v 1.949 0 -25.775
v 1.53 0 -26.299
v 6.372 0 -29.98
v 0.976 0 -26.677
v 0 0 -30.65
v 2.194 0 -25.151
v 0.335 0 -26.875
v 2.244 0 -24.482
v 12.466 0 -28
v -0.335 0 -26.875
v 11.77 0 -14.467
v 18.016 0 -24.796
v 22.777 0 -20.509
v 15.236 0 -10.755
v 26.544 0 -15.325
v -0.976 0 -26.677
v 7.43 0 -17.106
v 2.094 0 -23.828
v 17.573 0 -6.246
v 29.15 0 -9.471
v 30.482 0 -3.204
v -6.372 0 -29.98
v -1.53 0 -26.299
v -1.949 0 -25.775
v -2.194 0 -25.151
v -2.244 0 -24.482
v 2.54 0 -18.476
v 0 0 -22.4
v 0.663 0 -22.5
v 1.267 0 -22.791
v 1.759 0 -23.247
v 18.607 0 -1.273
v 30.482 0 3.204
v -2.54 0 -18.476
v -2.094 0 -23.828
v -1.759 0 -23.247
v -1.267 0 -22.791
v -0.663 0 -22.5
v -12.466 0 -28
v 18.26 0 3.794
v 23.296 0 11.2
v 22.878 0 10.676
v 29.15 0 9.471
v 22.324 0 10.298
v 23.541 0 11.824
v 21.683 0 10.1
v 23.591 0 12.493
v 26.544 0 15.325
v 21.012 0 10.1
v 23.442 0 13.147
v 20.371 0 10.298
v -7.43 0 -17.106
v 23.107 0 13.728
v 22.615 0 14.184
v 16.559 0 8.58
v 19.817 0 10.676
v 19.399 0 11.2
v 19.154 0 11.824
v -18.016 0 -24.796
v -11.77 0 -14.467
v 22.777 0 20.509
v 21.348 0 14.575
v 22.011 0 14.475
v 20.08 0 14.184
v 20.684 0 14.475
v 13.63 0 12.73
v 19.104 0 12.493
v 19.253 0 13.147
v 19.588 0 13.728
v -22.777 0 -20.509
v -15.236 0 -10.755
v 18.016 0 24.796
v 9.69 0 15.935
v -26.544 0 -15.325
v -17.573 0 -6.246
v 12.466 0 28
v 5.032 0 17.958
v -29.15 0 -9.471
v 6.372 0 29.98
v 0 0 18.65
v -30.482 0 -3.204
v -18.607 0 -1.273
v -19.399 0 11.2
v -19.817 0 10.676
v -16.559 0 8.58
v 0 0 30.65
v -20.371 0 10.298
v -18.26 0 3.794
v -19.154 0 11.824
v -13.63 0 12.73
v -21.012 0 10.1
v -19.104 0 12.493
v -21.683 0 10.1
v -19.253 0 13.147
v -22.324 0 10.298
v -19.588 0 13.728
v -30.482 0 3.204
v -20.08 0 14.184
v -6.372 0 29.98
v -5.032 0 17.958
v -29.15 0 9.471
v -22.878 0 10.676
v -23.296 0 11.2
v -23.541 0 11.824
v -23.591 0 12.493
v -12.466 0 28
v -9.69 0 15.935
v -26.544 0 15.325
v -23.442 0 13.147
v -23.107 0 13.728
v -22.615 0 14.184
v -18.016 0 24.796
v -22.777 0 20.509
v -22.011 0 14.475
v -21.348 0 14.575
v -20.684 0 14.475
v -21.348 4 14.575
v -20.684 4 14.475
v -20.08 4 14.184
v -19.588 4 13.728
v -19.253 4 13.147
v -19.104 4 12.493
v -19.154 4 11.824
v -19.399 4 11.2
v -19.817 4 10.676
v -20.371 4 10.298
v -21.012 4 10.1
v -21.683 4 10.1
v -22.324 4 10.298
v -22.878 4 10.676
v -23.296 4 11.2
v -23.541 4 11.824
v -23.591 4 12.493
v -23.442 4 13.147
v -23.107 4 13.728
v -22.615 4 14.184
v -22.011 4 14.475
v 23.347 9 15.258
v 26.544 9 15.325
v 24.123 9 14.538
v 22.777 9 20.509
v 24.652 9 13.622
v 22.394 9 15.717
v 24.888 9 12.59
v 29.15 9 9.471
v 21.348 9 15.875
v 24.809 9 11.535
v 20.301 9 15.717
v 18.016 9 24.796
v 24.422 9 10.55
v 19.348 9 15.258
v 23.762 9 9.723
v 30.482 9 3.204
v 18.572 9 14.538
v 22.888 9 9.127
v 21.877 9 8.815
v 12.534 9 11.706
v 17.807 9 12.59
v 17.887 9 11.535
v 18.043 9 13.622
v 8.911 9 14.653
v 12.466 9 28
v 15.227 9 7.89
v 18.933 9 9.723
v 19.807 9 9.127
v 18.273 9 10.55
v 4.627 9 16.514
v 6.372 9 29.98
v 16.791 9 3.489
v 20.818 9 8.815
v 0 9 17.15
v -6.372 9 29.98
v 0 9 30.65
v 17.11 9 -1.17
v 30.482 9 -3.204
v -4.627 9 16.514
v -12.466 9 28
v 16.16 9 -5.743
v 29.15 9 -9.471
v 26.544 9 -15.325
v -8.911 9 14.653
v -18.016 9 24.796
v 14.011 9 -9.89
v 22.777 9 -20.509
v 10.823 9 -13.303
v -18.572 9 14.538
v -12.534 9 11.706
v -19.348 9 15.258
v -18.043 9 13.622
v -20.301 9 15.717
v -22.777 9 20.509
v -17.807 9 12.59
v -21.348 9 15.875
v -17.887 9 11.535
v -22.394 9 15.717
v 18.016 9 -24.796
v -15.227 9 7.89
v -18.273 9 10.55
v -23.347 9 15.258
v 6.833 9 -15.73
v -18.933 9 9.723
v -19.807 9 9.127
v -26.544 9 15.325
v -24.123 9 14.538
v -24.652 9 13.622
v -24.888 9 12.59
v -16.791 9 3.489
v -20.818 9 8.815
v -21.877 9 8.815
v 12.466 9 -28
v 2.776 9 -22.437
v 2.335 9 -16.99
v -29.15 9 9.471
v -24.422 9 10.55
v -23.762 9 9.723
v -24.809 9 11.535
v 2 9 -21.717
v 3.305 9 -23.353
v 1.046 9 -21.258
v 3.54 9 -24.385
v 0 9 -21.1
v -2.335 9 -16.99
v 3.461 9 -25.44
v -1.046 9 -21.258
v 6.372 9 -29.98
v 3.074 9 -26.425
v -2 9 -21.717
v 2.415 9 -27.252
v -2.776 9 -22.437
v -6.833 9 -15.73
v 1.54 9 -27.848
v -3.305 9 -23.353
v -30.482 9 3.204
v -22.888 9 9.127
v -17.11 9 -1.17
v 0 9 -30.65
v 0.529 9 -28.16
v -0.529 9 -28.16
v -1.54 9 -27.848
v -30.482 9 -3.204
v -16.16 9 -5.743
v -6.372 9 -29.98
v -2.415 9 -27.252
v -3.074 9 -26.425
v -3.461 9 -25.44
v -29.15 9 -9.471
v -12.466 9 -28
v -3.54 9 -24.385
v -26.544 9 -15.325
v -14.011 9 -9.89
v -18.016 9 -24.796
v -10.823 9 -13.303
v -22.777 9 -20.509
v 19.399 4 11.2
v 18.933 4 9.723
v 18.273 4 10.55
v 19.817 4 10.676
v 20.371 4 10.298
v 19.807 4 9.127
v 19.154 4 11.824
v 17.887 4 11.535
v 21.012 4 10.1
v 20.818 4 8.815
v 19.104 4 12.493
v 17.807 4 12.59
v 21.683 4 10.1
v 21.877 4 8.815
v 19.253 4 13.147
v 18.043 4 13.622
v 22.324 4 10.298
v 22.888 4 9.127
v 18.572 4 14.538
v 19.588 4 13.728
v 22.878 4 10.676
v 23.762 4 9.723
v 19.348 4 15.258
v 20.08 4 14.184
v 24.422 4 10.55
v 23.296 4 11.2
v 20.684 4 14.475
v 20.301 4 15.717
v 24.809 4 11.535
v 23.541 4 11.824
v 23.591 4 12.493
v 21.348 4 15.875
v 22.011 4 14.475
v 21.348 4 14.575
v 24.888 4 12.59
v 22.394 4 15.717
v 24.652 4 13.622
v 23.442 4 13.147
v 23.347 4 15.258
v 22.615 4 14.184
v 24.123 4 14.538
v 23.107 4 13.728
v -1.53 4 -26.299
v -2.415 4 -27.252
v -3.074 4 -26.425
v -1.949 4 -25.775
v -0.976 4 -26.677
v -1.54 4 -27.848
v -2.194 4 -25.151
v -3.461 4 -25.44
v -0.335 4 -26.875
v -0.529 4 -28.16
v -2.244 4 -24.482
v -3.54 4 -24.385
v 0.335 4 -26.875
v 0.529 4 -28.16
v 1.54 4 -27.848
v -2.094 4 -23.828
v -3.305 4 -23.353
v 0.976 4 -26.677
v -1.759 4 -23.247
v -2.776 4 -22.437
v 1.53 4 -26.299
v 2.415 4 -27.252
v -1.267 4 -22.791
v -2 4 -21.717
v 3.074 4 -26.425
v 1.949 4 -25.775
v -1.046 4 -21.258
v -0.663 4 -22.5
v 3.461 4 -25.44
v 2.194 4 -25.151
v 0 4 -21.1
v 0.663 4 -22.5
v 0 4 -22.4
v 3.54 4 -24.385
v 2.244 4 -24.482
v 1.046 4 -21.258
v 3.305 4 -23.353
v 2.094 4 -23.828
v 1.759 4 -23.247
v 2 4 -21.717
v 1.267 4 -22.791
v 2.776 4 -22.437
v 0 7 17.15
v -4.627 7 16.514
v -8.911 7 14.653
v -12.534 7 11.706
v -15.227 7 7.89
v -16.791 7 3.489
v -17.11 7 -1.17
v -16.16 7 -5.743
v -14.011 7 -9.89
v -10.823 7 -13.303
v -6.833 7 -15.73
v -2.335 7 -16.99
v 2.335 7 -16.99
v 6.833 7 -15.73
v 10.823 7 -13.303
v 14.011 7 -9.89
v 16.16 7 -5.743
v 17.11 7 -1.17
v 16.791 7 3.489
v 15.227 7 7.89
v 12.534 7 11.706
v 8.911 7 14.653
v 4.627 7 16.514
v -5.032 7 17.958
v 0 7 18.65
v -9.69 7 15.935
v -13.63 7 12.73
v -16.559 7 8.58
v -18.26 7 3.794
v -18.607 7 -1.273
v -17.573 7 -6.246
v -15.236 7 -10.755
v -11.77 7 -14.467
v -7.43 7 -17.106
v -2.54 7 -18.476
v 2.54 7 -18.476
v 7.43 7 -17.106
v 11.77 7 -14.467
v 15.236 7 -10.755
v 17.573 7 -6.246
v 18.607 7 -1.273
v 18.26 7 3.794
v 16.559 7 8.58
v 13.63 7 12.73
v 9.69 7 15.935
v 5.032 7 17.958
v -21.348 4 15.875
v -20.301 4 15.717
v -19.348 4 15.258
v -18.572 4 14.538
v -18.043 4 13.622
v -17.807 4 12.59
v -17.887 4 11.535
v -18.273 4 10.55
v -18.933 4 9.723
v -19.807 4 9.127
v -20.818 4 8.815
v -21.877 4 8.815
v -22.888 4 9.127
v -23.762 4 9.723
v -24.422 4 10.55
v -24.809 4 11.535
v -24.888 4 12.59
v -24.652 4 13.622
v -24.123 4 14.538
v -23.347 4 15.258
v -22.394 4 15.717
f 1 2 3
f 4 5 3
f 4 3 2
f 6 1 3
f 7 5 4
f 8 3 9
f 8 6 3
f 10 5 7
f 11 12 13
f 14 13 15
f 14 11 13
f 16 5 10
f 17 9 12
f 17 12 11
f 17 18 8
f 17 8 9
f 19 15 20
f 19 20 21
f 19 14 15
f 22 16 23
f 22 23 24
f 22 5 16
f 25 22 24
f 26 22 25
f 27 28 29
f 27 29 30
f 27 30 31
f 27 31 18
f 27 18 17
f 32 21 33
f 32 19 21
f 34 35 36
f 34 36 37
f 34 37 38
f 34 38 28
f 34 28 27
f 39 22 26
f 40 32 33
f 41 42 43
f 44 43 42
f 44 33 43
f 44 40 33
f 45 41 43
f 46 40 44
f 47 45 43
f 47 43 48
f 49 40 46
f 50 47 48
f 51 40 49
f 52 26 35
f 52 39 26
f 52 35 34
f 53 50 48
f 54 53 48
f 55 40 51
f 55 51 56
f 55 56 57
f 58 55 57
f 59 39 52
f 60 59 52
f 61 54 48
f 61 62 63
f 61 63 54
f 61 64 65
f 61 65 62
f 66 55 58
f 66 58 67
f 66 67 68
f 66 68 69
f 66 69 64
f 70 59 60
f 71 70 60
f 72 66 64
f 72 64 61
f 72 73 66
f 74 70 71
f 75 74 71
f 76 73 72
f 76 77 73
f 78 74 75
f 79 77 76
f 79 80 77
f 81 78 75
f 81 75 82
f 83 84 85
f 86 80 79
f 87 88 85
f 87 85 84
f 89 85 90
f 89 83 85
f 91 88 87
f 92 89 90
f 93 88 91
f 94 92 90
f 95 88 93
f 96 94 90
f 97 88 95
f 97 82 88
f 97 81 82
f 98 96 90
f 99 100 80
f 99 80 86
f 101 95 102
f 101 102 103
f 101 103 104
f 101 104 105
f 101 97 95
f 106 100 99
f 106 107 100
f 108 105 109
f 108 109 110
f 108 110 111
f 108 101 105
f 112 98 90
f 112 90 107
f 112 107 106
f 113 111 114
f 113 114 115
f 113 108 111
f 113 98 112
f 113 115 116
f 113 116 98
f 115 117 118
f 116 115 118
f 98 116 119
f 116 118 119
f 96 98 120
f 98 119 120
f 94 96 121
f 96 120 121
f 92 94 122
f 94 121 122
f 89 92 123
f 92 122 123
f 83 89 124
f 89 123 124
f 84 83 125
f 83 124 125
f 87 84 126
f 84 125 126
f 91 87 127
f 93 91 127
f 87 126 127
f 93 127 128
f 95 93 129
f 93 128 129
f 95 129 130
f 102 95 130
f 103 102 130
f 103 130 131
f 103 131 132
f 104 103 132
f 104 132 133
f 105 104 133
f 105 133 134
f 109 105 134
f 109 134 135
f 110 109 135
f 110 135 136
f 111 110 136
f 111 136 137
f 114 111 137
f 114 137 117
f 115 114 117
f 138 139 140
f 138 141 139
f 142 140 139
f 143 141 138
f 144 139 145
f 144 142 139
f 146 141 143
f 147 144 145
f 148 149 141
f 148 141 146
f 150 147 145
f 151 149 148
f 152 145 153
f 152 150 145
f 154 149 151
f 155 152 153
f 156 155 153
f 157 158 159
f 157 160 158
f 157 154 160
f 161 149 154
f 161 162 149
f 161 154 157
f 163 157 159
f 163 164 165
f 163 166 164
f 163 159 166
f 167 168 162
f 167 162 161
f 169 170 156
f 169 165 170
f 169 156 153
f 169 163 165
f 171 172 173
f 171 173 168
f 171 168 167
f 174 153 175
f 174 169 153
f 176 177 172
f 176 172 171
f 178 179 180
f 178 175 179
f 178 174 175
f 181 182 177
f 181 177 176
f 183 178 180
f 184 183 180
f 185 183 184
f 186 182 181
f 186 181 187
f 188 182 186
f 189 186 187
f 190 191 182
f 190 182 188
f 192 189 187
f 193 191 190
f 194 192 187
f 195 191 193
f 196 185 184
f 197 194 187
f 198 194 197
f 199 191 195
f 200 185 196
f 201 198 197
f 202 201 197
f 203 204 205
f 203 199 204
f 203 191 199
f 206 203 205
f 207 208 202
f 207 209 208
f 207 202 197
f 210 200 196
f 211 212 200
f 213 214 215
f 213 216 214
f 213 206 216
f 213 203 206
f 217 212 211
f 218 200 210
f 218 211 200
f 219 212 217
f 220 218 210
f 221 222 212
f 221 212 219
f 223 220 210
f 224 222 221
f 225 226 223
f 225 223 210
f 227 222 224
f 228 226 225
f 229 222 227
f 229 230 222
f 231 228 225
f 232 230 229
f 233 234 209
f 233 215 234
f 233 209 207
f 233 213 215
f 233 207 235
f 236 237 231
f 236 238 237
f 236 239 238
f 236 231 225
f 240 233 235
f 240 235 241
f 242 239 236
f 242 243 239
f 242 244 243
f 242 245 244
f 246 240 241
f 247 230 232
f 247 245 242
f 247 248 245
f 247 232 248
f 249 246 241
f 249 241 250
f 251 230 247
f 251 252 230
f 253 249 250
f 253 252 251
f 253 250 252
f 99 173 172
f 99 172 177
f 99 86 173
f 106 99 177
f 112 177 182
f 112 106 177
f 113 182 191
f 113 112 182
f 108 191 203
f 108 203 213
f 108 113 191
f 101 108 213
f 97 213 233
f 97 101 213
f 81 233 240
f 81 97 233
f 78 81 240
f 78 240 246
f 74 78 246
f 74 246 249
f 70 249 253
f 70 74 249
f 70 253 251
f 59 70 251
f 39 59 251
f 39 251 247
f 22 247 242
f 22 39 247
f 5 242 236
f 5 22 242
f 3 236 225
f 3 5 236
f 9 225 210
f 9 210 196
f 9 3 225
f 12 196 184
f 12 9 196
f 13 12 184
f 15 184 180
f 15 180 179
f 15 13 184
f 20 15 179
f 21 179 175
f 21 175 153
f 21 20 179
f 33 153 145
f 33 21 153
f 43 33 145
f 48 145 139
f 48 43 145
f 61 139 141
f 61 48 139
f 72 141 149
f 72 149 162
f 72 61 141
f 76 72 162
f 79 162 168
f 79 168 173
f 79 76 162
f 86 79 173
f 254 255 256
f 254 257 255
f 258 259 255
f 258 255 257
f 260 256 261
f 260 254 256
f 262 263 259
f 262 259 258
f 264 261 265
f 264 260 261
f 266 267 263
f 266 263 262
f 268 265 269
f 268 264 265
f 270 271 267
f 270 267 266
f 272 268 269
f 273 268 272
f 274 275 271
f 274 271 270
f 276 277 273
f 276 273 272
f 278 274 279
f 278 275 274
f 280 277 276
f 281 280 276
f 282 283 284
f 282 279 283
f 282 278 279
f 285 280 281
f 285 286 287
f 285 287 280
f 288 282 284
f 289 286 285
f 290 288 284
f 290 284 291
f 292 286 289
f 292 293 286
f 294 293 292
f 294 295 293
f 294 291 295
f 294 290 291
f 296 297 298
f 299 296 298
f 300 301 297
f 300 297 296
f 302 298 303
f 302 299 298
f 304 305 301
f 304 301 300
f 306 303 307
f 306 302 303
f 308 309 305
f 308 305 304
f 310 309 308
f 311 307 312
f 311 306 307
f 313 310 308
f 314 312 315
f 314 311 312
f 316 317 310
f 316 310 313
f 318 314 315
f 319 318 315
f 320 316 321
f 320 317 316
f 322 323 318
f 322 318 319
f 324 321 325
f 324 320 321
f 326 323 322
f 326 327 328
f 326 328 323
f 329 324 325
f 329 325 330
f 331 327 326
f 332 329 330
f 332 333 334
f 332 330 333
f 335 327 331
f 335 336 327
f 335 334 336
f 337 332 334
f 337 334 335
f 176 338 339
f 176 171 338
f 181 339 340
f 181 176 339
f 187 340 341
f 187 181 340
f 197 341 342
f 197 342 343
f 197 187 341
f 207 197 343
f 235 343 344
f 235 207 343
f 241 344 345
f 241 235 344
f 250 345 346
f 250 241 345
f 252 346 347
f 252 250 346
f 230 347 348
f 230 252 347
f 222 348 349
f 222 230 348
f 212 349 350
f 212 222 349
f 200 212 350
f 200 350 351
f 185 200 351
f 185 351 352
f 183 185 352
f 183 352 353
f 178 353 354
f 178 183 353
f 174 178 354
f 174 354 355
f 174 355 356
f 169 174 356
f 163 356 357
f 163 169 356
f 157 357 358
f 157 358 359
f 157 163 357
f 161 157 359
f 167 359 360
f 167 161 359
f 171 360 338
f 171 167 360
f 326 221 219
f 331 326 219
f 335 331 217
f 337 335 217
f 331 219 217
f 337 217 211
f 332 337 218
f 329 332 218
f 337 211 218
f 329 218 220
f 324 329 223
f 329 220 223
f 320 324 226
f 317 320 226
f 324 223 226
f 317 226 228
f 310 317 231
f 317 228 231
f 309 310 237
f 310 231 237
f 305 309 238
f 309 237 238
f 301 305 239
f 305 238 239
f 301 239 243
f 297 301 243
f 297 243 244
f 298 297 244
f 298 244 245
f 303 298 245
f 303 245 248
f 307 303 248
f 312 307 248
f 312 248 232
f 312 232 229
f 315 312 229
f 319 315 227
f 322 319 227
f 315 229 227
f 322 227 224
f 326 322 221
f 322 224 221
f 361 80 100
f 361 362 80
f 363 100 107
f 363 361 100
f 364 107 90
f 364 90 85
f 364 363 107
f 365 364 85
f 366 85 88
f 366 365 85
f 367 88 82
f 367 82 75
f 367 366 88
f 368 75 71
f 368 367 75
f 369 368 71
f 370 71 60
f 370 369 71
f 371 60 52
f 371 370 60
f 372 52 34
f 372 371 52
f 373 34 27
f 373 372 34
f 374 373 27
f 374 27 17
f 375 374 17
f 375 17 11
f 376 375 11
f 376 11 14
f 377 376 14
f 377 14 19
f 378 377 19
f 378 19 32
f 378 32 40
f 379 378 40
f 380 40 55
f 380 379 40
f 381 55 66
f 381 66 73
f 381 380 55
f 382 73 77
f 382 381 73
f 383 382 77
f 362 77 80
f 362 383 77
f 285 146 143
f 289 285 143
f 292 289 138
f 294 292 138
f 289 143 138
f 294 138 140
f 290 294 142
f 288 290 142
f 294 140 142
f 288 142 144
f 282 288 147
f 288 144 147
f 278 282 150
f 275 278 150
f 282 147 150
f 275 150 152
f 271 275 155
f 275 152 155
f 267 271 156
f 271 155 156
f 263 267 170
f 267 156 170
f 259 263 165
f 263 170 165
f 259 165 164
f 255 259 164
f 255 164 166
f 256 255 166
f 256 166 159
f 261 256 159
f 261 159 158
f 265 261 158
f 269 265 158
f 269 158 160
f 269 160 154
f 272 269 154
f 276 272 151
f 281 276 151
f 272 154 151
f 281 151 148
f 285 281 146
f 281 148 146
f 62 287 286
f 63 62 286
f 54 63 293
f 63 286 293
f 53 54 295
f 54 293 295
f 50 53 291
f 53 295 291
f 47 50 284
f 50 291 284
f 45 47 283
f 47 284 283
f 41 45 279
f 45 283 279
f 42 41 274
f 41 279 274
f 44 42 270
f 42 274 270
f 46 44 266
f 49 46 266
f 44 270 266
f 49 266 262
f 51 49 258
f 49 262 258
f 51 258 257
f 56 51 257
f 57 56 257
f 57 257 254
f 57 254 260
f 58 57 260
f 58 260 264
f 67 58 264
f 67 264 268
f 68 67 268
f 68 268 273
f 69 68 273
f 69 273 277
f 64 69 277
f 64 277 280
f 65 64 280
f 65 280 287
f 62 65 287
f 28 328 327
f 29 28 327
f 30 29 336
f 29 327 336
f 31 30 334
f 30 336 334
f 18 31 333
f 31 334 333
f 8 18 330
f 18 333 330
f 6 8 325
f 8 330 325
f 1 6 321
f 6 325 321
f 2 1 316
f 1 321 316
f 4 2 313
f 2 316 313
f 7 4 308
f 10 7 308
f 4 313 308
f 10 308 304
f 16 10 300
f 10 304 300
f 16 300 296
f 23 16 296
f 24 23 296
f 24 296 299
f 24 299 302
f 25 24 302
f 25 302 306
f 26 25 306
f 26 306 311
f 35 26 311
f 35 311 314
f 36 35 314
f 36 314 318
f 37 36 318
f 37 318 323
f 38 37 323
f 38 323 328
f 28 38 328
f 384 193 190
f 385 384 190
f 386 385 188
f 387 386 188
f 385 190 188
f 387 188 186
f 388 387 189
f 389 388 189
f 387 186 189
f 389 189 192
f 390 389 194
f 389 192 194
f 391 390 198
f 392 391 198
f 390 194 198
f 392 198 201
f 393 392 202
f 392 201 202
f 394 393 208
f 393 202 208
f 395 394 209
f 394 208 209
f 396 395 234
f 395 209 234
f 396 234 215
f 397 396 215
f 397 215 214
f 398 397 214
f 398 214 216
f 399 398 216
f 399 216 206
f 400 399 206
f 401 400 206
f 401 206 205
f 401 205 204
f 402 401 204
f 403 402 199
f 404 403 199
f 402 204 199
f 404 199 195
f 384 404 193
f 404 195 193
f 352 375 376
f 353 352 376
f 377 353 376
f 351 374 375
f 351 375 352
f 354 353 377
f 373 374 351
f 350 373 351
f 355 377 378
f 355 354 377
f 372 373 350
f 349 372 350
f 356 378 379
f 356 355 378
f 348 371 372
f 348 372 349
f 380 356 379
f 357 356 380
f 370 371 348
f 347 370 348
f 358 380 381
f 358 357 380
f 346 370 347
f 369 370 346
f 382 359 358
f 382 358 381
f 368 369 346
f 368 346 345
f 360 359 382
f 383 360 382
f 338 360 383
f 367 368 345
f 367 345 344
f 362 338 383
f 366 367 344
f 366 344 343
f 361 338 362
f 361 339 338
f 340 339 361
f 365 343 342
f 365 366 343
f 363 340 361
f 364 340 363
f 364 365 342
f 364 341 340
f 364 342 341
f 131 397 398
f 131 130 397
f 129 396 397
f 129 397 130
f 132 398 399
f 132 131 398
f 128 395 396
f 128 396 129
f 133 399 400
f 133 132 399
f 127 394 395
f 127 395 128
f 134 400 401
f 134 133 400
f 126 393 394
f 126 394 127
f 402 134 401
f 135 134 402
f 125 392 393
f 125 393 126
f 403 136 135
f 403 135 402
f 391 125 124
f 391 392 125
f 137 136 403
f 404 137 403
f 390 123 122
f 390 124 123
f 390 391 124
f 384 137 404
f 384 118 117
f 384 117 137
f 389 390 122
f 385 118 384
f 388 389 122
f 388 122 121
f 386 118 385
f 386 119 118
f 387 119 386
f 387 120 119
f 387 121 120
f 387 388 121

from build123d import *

# Parameters (mm, degrees)
SKETCH_2_R            = 2.25
CUT_EXTRUDE_673_DEPTH = 45.270136661
SKETCH_2_3_R          = 3.55
SKETCH_2_3_R_2        = 2.25
CUT_EXTRUDE_707_DEPTH = 5


with BuildPart() as part:
    # Sketch 278 → Повернуть1 (revolve)
    with BuildSketch(Plane.XY):
        Polygon((17.15, 9), (30.65, 9), (30.65, 0), (18.65, 0), (18.65, 7), (17.15, 7), align=None)
    revolve(axis=Axis((0, 23.662648221, 0), (0, -1, 0)))

    # Эскиз2 → Cut-Extrude 673 (cut, through all)
    with BuildSketch(Plane(origin=(0, 9, 0), x_dir=(1, 0, 0), z_dir=(0, 1, 0))):
        with Locations((0, 24.65)):
            Circle(SKETCH_2_R)
        with Locations((21.347526203, -12.325)):
            Circle(SKETCH_2_R)
        with Locations((-21.347526203, -12.325)):
            Circle(SKETCH_2_R)
    extrude(amount=-CUT_EXTRUDE_673_DEPTH, mode=Mode.SUBTRACT)

    # Эскиз2<3> → Cut-Extrude 707 (cut)
    # profile 1 of 3: a face of its own
    with BuildSketch(Plane(origin=(0, 9, 0), x_dir=(1, 0, 0), z_dir=(0, 1, 0))):
        with Locations((0, 24.65)):
            Circle(SKETCH_2_3_R)
        with Locations((0, 24.65)):
            Circle(SKETCH_2_3_R_2, mode=Mode.SUBTRACT)
    # profile 2 of 3: a face of its own
    with BuildSketch(Plane(origin=(0, 9, 0), x_dir=(1, 0, 0), z_dir=(0, 1, 0))):
        with Locations((-21.347526203, -12.325)):
            Circle(SKETCH_2_3_R)
        with Locations((-21.347526203, -12.325)):
            Circle(SKETCH_2_3_R_2, mode=Mode.SUBTRACT)
    # profile 3 of 3: a face of its own
    with BuildSketch(Plane(origin=(0, 9, 0), x_dir=(1, 0, 0), z_dir=(0, 1, 0))):
        with Locations((21.347526203, -12.325)):
            Circle(SKETCH_2_3_R)
        with Locations((21.347526203, -12.325)):
            Circle(SKETCH_2_3_R_2, mode=Mode.SUBTRACT)
    extrude(amount=-CUT_EXTRUDE_707_DEPTH, mode=Mode.SUBTRACT)


solid = part.part
